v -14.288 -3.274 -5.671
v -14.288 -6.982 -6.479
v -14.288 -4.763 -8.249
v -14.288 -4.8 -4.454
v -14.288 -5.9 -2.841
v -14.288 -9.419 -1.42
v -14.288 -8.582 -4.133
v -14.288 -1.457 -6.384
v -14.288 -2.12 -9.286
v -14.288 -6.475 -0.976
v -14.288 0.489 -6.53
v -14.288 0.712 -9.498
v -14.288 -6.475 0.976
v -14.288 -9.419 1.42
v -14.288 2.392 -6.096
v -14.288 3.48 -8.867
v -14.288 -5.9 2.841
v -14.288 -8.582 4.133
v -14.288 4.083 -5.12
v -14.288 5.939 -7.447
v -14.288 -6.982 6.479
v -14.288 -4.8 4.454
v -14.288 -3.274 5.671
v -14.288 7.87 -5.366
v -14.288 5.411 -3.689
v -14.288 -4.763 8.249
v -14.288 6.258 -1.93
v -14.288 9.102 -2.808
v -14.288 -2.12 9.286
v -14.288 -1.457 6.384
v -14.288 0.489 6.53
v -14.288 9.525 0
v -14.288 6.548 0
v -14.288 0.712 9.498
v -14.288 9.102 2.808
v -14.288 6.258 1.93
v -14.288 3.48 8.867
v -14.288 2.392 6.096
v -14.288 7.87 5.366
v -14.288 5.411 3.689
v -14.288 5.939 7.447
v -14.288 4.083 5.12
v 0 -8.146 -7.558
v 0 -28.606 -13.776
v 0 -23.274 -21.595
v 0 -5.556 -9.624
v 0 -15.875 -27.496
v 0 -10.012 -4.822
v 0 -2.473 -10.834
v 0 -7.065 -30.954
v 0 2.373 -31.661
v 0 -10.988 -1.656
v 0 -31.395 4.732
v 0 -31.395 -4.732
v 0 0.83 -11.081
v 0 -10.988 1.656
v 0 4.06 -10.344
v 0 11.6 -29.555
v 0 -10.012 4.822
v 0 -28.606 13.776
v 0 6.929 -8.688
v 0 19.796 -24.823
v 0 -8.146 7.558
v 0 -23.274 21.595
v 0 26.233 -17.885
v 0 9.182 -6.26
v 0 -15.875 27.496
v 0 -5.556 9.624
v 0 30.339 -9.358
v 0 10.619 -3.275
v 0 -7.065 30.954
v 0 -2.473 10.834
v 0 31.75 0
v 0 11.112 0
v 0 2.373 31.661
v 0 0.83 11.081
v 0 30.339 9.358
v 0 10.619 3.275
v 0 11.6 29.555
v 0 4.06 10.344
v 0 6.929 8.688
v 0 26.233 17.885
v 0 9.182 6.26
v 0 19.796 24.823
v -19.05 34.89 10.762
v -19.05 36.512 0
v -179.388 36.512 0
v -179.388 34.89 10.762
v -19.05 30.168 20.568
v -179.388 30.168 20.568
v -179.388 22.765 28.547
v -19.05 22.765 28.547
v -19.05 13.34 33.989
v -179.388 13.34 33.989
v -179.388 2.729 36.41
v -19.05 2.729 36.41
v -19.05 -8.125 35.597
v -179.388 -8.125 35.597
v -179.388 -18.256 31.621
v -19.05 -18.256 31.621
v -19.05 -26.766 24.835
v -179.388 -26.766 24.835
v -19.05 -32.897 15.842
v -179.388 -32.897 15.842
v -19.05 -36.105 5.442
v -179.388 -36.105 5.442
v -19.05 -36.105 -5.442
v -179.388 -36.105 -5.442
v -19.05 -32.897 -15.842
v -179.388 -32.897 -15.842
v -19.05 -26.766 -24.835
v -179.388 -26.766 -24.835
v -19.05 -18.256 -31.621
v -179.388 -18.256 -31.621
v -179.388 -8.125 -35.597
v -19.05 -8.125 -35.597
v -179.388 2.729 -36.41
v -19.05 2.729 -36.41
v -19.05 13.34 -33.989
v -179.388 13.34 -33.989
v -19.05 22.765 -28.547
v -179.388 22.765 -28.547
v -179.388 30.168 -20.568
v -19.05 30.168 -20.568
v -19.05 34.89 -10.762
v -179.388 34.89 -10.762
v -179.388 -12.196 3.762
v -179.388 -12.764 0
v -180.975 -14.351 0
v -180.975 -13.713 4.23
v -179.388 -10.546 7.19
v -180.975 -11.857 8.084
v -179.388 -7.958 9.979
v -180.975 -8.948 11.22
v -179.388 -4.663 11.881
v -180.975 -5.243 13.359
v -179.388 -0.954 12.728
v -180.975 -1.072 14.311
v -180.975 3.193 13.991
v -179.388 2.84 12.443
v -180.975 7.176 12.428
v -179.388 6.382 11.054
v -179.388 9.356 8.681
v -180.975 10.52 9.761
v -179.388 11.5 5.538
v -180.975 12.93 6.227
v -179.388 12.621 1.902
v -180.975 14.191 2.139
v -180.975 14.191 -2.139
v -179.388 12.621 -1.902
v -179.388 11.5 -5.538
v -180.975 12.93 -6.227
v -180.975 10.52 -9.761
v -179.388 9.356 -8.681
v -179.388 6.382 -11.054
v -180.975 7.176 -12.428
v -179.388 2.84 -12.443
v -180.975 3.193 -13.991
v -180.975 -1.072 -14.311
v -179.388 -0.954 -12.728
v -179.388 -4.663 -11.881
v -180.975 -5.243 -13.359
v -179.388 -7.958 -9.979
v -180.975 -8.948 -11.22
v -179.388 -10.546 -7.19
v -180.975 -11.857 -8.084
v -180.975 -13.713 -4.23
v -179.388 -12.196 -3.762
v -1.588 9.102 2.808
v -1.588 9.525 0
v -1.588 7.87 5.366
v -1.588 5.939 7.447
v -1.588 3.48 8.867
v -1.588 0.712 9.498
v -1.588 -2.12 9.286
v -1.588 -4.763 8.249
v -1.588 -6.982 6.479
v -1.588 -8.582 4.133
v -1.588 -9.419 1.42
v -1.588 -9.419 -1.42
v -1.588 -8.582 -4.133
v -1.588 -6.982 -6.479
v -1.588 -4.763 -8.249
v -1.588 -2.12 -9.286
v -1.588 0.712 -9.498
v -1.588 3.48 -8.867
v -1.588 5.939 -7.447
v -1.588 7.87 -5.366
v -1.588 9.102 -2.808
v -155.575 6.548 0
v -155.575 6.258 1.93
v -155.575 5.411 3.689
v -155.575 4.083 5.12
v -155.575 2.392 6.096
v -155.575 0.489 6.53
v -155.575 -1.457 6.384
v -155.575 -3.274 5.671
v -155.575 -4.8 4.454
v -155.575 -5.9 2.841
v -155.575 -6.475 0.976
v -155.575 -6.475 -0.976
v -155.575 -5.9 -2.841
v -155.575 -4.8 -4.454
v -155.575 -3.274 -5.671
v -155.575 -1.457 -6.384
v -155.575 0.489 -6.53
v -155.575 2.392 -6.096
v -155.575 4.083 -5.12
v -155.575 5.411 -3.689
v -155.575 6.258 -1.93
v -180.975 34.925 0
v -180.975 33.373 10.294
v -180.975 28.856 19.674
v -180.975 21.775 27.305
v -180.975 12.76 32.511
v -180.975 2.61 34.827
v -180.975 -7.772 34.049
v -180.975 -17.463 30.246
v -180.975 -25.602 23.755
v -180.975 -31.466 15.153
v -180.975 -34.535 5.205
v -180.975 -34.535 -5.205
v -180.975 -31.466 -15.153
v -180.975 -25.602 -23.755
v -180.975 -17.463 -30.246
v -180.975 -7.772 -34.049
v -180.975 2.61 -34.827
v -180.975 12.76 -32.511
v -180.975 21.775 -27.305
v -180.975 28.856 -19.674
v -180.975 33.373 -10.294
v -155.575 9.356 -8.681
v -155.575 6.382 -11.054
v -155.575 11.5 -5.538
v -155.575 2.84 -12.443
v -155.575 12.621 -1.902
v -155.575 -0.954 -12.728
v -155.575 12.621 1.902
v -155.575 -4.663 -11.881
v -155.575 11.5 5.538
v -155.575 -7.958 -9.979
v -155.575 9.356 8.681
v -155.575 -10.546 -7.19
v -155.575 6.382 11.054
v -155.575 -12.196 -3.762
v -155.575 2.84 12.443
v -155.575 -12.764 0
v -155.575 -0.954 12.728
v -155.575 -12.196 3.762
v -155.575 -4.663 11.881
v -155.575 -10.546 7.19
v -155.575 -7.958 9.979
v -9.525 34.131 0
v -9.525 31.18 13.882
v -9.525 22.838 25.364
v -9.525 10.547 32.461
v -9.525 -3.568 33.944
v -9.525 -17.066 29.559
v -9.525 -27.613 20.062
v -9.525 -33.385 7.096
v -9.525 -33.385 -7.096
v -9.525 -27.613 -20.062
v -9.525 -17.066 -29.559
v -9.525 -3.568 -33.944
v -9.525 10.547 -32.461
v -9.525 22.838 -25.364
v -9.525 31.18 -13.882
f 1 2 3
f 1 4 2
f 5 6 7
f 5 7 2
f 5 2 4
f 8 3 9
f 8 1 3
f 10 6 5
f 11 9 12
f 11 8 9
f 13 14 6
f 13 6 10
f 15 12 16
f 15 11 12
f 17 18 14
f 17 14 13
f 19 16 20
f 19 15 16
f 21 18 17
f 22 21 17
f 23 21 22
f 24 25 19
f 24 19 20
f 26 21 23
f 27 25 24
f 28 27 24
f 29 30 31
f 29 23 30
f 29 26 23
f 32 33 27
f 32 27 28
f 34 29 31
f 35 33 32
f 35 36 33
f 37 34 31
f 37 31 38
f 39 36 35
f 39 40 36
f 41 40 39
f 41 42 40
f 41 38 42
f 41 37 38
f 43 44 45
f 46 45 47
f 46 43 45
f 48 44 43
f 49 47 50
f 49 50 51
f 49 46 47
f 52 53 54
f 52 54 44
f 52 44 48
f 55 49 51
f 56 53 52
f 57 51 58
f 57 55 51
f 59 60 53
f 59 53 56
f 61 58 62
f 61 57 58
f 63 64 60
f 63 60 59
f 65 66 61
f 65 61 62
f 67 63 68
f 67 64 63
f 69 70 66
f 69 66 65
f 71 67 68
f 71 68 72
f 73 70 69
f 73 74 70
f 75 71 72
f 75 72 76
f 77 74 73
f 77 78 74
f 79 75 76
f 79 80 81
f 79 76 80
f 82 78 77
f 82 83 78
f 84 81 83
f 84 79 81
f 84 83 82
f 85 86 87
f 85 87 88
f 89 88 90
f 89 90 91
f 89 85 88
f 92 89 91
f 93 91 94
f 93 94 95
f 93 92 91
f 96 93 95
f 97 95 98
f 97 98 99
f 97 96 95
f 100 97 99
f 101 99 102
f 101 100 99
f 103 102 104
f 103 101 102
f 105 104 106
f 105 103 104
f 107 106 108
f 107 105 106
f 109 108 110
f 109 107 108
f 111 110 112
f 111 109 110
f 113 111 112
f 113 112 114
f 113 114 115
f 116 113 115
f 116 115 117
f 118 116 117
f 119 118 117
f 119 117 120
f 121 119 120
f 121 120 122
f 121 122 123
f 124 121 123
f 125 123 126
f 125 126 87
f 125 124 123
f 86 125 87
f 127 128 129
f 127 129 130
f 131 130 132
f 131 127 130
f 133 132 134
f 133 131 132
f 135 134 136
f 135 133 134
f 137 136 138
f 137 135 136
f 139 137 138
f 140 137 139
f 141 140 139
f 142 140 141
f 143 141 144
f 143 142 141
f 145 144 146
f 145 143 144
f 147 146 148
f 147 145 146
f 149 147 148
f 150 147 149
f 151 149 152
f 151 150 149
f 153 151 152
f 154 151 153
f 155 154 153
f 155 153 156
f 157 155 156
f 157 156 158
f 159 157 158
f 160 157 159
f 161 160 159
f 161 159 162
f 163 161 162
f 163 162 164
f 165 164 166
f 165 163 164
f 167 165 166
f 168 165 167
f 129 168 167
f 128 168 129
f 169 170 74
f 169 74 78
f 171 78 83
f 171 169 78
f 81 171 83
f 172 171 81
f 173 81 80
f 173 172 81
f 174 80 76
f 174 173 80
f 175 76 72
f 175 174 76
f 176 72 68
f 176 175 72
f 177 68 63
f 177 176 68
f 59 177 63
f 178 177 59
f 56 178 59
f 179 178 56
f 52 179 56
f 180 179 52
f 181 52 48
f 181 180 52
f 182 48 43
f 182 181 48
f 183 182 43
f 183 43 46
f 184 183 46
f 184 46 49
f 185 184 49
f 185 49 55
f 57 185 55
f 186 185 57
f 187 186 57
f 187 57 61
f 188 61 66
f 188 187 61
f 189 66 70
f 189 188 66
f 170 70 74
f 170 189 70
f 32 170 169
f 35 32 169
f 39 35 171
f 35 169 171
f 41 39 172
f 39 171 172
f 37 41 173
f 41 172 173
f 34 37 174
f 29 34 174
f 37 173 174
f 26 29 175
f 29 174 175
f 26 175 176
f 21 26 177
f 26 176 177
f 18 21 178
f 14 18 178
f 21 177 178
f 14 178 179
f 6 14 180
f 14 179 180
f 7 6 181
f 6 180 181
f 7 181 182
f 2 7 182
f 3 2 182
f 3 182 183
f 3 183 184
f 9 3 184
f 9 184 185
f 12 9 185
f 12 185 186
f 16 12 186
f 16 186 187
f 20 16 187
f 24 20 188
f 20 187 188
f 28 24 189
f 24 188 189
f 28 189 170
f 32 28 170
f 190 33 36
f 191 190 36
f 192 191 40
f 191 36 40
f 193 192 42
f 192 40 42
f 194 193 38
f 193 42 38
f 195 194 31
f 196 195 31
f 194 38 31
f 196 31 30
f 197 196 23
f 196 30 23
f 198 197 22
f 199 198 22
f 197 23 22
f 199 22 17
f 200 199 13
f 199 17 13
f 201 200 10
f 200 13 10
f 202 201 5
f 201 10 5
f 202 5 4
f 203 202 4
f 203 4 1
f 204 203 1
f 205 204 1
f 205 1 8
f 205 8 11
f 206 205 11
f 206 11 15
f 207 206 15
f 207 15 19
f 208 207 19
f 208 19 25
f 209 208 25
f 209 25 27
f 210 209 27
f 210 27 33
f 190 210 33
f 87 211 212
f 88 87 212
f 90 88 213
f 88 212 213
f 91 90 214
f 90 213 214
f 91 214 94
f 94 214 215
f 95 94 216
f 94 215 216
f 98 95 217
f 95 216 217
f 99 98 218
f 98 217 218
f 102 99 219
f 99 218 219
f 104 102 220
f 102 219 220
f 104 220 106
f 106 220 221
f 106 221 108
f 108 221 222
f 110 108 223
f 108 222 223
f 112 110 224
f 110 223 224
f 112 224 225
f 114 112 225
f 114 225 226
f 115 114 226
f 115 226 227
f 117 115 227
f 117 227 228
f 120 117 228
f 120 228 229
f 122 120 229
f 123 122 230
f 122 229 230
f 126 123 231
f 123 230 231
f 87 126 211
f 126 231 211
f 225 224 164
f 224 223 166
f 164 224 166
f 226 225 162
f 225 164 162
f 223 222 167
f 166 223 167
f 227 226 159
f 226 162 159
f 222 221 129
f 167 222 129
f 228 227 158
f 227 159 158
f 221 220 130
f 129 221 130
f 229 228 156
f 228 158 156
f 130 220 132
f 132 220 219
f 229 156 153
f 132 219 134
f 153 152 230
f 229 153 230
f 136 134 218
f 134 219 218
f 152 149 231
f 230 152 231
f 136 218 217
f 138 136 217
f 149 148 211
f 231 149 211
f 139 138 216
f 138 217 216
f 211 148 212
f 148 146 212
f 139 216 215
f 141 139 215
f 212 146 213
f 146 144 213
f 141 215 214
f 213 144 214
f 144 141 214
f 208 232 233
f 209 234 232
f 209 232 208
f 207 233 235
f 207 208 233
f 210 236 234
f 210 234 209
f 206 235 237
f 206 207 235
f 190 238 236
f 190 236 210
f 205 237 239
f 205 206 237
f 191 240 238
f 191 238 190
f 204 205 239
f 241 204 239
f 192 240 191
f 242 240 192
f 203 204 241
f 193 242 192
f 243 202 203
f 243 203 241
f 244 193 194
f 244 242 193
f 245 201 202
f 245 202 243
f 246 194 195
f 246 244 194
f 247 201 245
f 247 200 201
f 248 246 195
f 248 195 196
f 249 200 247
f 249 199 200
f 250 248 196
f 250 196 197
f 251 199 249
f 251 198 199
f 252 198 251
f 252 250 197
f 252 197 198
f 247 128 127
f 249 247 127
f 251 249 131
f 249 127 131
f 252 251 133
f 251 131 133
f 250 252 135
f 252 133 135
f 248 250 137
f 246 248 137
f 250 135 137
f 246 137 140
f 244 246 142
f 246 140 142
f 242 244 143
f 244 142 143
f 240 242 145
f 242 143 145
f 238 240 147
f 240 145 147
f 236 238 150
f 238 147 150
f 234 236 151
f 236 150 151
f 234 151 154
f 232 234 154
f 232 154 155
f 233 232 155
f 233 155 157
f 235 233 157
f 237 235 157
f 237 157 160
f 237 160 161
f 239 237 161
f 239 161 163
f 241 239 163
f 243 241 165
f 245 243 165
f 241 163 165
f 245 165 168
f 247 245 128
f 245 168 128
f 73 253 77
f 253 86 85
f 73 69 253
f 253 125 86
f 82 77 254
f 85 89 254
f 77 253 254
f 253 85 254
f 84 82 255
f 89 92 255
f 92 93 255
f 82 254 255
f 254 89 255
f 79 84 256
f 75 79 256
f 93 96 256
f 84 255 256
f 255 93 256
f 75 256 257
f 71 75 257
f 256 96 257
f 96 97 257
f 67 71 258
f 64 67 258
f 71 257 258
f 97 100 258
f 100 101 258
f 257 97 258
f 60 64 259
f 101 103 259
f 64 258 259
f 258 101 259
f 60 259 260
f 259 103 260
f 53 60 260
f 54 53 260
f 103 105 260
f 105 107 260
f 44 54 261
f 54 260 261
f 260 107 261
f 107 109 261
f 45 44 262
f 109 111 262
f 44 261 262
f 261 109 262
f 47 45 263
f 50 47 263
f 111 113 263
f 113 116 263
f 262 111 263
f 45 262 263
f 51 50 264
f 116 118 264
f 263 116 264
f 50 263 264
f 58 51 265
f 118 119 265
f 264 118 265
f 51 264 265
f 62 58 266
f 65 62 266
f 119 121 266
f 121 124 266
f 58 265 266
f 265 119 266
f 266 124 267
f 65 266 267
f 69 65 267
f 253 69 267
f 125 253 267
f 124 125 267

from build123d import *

# Parameters (mm, degrees)
F0_R     = 36.5125
F1_DEPTH = 180.975
F2_R     = 6.5484375
F3_DEPTH = 180.976
F4_R     = 9.525
F5_DEPTH = 14.2875
F6_R     = 12.7635
F7_DEPTH = 25.4
F8_SIZE  = 1.5875
F9_SIZE2 = 19.05
F9_SIZE  = 4.7625


with BuildPart() as f1:
    # F0 (on Right) → F1 (new body)
    with BuildSketch(Plane.YZ):
        Circle(F0_R)
    extrude(amount=-F1_DEPTH)

    # F2 (on face) → F3 (cut, through all)
    with BuildSketch(Plane.YZ):
        Circle(F2_R)
    extrude(amount=-F3_DEPTH, mode=Mode.SUBTRACT)

    # F4 (on face) → F5 (cut)
    with BuildSketch(Plane.YZ):
        Circle(F4_R)
    extrude(amount=-F5_DEPTH, mode=Mode.SUBTRACT)

    # F6 (on face) → F7 (cut)
    with BuildSketch(Plane(origin=(-180.975, 0, 0), x_dir=(0, -1, 0), z_dir=(-1, 0, 0))):
        Circle(F6_R)
    extrude(amount=-F7_DEPTH, mode=Mode.SUBTRACT)

    # F8
    f8_edges = [f1.edges().sort_by_distance(p)[0] for p in [
        (0, -9.525, 0),
        (-180.975, -36.5125, 0),
        (-180.975, 12.7635, 0),
    ]]
    chamfer(f8_edges, length=F8_SIZE)

    # F9
    f9_edges = [f1.edges().sort_by_distance(p)[0] for p in [
        (0, -36.5125, 0),
    ]]
    f9_side = f1.faces().sort_by_distance((0, -12.145229, 0))[0]
    chamfer(f9_edges, length=F9_SIZE, length2=F9_SIZE2, reference=f9_side)


solid = f1.part
